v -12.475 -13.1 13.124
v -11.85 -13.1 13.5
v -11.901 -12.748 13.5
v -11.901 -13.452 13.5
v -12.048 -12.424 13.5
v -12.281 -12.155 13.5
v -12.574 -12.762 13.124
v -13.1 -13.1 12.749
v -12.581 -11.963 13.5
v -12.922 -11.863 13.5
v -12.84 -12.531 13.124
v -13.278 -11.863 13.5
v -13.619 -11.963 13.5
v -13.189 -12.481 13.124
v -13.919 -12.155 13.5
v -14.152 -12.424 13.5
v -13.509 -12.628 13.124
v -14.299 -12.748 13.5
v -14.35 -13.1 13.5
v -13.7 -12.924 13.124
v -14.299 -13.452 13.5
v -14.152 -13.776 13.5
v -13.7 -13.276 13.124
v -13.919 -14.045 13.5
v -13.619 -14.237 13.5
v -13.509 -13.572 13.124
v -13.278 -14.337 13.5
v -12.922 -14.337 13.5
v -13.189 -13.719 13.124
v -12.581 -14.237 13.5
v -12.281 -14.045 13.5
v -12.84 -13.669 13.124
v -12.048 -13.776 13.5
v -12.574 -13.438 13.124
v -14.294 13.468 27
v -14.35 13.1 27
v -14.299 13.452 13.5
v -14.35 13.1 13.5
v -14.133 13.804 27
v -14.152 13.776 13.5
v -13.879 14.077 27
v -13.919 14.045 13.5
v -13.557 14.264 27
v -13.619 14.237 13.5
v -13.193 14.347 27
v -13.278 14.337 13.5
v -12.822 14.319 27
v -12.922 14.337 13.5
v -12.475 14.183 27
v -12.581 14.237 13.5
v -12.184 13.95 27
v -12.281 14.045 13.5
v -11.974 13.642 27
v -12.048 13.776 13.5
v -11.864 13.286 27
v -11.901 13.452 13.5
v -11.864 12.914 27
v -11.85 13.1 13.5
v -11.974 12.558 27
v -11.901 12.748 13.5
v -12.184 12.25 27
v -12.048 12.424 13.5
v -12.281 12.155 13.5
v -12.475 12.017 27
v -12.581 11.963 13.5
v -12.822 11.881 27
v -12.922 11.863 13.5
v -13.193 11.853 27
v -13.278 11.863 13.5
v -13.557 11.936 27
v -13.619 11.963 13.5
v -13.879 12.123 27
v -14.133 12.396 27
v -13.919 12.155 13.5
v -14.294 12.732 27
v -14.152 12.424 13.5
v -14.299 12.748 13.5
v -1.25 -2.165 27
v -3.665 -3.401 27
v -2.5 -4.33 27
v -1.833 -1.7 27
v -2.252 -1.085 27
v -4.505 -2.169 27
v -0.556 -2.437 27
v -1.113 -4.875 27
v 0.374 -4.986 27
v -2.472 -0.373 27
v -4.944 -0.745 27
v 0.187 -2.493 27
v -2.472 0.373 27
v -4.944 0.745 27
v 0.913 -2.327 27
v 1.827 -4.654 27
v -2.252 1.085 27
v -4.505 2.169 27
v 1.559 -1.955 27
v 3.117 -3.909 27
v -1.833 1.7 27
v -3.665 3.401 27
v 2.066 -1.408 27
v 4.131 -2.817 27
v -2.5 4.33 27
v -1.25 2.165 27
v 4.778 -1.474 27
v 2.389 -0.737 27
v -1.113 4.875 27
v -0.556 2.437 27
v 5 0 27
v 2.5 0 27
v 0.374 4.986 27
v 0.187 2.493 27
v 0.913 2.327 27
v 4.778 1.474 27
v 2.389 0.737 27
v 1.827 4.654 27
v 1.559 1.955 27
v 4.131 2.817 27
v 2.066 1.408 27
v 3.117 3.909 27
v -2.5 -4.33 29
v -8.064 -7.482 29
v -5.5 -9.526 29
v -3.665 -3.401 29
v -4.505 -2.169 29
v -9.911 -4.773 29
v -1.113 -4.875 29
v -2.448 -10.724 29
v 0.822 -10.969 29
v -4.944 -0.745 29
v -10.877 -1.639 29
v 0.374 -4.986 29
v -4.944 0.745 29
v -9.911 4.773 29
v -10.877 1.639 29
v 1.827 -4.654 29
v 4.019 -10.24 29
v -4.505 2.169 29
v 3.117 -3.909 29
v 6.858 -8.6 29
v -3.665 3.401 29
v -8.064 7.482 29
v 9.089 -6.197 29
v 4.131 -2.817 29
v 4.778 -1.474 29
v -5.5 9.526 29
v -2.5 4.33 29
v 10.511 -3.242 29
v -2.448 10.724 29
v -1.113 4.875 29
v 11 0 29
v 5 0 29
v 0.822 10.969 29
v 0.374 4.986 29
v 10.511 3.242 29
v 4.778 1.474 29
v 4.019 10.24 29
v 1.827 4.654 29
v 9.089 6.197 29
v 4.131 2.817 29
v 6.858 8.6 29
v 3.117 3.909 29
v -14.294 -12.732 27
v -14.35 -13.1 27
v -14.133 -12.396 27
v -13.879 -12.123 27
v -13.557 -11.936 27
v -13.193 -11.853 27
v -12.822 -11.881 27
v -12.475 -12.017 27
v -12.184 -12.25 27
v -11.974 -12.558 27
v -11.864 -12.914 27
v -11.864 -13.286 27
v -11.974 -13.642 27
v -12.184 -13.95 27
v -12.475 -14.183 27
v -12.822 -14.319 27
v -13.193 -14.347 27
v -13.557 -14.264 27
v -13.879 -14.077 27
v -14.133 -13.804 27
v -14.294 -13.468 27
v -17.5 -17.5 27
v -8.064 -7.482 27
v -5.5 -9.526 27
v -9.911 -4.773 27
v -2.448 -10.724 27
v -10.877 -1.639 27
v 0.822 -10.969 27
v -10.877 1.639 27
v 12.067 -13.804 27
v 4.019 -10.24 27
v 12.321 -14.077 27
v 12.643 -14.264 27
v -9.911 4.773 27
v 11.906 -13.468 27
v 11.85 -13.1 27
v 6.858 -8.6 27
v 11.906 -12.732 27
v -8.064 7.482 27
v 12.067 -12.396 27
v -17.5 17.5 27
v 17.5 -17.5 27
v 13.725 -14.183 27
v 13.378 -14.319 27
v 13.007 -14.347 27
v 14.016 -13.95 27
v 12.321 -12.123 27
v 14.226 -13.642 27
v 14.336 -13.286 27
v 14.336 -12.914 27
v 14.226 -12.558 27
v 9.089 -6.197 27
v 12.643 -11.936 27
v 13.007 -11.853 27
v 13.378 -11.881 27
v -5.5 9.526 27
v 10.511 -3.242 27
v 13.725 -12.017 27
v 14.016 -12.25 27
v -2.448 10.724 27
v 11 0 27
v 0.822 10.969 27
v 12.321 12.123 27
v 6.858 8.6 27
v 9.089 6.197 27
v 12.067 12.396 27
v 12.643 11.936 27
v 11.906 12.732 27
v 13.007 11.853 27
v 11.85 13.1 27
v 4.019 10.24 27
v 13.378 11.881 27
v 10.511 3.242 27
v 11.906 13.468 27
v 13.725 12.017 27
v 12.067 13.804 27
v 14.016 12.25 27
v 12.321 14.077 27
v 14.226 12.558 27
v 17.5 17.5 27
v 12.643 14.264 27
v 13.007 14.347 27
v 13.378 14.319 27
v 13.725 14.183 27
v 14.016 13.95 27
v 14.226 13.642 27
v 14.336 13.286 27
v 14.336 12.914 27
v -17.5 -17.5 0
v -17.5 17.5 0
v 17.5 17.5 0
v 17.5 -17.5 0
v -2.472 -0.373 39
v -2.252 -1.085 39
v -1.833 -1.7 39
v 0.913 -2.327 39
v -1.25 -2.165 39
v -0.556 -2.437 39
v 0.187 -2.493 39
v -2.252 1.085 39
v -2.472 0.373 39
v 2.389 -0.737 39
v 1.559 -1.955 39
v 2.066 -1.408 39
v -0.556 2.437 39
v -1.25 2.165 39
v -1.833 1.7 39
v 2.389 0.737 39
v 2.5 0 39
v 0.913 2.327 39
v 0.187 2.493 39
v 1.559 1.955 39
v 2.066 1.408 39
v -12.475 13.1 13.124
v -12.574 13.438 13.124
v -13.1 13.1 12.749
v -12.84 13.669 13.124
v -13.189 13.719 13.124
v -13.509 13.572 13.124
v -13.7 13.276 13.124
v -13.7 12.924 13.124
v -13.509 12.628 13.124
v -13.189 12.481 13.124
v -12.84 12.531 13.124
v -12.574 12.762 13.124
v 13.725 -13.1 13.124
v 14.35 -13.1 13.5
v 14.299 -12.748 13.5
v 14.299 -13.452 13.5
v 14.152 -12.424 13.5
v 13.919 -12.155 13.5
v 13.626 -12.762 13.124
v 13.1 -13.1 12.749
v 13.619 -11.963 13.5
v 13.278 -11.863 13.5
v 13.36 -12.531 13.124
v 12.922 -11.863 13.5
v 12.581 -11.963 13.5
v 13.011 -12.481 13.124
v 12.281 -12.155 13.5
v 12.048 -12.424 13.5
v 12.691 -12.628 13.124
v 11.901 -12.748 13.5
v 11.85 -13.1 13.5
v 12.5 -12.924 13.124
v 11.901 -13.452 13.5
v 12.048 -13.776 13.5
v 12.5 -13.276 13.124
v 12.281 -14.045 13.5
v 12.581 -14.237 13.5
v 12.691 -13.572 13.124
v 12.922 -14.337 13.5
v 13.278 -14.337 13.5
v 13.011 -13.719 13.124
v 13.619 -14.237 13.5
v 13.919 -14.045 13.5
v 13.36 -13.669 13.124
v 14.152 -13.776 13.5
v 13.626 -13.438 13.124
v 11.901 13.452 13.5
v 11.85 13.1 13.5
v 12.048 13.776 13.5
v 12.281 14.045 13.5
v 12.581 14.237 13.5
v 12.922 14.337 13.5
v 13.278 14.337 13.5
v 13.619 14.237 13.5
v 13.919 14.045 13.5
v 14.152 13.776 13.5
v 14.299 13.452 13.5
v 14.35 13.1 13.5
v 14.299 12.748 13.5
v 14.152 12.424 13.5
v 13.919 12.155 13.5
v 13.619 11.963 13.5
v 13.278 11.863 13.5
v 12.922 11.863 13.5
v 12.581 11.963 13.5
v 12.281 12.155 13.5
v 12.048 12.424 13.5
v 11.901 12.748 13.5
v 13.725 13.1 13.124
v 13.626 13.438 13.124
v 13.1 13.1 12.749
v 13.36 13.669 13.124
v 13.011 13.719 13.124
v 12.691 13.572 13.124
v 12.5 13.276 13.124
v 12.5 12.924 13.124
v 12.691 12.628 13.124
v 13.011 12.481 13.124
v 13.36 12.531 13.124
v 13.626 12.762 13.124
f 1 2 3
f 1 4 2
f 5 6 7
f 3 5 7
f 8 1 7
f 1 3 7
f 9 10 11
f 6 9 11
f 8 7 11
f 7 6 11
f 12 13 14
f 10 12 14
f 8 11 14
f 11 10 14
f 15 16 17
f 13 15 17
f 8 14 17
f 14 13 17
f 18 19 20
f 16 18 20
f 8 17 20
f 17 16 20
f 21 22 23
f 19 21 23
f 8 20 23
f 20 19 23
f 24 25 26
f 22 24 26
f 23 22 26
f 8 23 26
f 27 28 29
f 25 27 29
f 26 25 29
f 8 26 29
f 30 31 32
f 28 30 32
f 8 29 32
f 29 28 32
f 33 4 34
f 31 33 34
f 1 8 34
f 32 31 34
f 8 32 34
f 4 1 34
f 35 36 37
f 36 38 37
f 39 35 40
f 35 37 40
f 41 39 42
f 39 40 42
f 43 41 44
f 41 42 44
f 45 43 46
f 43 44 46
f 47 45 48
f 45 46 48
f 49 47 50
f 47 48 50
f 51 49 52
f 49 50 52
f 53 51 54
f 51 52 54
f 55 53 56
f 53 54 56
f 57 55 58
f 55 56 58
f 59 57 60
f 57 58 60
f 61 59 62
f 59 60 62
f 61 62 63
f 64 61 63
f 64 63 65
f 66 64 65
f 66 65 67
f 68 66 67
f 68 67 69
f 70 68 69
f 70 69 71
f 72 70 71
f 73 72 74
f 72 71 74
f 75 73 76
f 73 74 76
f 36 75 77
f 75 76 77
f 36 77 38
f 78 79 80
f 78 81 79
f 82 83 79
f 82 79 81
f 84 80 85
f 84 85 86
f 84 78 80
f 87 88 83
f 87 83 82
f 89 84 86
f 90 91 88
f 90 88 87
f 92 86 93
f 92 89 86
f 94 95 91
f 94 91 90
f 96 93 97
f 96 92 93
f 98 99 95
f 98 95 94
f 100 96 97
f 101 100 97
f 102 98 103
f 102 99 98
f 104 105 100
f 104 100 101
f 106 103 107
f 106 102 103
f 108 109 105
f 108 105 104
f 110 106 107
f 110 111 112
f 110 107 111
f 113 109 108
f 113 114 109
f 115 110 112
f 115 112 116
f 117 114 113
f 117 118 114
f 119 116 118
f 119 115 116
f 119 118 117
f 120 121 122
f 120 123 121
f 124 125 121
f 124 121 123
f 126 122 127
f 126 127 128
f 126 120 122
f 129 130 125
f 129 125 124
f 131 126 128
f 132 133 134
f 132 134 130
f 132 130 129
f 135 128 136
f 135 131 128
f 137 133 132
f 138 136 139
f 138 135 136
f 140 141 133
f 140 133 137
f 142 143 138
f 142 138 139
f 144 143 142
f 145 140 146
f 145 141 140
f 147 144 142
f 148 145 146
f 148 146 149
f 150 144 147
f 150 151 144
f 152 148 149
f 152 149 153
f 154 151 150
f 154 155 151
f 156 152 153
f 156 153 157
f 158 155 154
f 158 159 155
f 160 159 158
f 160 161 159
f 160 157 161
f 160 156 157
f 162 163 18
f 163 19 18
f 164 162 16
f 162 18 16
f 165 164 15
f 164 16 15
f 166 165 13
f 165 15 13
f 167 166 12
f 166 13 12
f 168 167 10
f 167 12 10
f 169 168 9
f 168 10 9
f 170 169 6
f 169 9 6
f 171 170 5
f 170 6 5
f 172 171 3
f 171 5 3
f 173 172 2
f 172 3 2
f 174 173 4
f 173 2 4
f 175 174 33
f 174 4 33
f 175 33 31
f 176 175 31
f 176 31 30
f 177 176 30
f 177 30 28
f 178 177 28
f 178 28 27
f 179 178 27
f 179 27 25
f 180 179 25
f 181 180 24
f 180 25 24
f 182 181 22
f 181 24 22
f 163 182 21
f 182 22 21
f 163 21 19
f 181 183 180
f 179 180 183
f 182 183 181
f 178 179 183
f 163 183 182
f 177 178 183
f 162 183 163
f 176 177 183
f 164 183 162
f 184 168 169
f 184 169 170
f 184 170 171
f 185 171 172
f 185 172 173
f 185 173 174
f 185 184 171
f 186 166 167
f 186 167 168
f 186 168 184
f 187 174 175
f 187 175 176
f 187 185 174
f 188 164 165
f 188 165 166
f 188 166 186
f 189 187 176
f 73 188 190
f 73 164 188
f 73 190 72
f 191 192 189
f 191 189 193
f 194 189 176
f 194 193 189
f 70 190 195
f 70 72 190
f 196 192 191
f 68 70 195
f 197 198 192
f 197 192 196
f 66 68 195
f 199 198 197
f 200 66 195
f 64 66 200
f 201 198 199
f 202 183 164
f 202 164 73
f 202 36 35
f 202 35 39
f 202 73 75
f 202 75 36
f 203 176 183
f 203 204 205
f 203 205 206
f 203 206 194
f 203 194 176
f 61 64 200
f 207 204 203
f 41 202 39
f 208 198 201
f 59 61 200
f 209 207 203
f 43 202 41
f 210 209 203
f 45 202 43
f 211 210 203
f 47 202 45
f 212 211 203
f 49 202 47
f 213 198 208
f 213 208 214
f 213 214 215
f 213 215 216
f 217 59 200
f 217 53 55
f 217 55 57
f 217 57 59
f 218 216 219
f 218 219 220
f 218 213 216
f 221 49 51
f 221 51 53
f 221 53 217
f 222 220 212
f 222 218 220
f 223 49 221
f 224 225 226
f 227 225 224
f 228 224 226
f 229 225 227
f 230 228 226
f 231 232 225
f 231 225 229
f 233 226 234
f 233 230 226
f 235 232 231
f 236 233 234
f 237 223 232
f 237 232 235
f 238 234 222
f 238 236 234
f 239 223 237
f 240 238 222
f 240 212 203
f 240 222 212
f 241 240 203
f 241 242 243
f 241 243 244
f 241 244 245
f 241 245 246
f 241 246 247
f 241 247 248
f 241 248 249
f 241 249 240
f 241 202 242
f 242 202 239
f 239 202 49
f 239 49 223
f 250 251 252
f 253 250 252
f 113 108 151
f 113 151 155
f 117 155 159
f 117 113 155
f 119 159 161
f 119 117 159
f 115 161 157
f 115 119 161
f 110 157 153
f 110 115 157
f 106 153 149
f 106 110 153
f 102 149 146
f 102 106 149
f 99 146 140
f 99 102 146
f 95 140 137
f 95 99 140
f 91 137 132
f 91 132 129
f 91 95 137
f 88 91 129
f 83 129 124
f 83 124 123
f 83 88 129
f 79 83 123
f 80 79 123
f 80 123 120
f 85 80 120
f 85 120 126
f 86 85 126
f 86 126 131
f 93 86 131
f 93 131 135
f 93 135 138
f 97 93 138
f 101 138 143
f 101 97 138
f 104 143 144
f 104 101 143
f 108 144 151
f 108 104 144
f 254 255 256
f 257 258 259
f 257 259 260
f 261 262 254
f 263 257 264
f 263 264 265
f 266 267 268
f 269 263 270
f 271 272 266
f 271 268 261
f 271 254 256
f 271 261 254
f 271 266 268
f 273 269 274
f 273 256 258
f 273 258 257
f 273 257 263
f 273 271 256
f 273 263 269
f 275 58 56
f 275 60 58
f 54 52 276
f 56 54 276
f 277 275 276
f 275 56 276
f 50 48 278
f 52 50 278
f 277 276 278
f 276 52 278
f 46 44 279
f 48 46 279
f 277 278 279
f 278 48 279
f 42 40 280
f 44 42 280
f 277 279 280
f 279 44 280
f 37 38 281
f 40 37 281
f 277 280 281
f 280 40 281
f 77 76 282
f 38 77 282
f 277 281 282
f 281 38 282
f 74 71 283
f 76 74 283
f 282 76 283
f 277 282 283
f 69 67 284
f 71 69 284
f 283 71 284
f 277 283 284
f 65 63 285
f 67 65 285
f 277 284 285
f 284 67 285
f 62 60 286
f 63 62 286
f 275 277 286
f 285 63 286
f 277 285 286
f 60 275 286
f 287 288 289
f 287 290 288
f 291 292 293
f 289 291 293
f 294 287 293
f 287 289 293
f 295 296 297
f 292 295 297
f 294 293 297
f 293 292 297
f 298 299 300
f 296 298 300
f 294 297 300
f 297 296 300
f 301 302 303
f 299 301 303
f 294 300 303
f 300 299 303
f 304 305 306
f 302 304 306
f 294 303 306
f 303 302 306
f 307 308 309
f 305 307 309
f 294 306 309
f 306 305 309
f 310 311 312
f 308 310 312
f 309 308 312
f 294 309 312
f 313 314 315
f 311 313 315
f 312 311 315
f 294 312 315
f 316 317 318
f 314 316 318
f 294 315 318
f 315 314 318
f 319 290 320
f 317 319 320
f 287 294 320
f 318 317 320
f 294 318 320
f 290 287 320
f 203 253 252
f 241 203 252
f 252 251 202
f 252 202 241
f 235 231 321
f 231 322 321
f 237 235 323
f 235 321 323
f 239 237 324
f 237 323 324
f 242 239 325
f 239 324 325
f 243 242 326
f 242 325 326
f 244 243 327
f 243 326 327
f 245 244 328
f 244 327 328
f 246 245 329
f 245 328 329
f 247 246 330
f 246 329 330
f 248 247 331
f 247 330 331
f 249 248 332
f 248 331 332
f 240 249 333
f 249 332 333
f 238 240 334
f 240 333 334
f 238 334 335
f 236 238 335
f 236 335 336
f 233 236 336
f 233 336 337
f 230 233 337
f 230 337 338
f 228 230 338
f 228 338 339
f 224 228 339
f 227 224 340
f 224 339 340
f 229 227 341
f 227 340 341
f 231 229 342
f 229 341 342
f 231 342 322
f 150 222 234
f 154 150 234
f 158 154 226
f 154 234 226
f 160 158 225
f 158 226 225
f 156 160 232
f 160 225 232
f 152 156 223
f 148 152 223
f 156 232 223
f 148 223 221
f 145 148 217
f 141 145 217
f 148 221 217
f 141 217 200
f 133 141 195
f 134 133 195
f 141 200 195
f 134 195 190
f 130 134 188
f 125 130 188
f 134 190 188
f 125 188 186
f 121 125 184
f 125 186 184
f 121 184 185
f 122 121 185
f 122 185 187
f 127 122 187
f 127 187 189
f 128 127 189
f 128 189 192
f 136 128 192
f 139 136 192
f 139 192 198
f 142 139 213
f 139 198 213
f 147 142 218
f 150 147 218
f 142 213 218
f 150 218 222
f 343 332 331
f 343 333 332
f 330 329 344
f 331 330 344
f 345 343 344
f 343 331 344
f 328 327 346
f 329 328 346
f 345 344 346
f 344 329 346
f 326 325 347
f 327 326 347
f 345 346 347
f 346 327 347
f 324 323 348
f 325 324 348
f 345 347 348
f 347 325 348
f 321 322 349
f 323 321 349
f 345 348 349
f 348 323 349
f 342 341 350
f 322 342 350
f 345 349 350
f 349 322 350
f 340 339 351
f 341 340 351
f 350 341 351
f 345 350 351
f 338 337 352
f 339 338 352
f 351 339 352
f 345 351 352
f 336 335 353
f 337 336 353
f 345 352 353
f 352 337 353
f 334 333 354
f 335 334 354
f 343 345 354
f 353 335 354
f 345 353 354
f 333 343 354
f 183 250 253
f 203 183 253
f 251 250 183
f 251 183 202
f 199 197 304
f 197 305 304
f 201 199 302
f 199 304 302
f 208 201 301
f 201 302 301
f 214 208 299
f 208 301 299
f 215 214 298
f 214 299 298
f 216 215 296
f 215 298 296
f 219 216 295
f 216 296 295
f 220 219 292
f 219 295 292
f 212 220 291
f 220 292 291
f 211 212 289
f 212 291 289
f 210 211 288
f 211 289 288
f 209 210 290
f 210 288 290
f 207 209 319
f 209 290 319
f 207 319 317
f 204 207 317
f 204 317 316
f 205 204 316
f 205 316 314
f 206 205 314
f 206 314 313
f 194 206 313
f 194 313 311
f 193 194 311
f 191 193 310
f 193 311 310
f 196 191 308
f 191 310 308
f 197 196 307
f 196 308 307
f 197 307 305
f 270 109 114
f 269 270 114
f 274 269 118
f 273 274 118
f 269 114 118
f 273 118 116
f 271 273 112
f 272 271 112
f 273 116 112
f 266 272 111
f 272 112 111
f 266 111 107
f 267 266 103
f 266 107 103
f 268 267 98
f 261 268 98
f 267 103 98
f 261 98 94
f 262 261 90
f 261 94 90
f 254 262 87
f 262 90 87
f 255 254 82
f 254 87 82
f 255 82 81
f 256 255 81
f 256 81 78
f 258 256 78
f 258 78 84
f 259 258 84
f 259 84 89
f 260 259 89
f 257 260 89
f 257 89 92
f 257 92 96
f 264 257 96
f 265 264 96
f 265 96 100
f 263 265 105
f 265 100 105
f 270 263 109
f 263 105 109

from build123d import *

# Parameters (mm, degrees)
F0_W     = 35
F0_H     = 35
F1_DEPTH = 27
F2_R     = 11
F2_R_2   = 5
F3_DEPTH = 2
F4_R     = 2.5
F5_DEPTH = 12
F7_D     = 2.5
F7_DEPTH = 13.5
F7_TIP   = 0.7510757738


with BuildPart() as f1:
    # F0 (on Top) → F1 (new body)
    with BuildSketch(Plane.XY):
        Rectangle(F0_W, F0_H)
    extrude(amount=F1_DEPTH)

    # F2 (on face) → F3 (join)
    with BuildSketch(Plane.XY.offset(27)):
        Circle(F2_R)
        Circle(F2_R_2, mode=Mode.SUBTRACT)
    extrude(amount=F3_DEPTH)

    # F4 (on face) → F5 (join)
    with BuildSketch(Plane.XY.offset(27)):
        Circle(F4_R)
    extrude(amount=F5_DEPTH)

    # F7
    with Locations(Plane.XY.offset(27)):
        with Locations((-13.1, 13.1), (13.1, 13.1), (13.1, -13.1), (-13.1, -13.1)):
            Hole(F7_D / 2, depth=F7_DEPTH)
            with Locations((0, 0, -(F7_DEPTH + F7_TIP / 2))):  # 118° drill point
                Cone(0, F7_D / 2, F7_TIP, mode=Mode.SUBTRACT)


solid = f1.part
